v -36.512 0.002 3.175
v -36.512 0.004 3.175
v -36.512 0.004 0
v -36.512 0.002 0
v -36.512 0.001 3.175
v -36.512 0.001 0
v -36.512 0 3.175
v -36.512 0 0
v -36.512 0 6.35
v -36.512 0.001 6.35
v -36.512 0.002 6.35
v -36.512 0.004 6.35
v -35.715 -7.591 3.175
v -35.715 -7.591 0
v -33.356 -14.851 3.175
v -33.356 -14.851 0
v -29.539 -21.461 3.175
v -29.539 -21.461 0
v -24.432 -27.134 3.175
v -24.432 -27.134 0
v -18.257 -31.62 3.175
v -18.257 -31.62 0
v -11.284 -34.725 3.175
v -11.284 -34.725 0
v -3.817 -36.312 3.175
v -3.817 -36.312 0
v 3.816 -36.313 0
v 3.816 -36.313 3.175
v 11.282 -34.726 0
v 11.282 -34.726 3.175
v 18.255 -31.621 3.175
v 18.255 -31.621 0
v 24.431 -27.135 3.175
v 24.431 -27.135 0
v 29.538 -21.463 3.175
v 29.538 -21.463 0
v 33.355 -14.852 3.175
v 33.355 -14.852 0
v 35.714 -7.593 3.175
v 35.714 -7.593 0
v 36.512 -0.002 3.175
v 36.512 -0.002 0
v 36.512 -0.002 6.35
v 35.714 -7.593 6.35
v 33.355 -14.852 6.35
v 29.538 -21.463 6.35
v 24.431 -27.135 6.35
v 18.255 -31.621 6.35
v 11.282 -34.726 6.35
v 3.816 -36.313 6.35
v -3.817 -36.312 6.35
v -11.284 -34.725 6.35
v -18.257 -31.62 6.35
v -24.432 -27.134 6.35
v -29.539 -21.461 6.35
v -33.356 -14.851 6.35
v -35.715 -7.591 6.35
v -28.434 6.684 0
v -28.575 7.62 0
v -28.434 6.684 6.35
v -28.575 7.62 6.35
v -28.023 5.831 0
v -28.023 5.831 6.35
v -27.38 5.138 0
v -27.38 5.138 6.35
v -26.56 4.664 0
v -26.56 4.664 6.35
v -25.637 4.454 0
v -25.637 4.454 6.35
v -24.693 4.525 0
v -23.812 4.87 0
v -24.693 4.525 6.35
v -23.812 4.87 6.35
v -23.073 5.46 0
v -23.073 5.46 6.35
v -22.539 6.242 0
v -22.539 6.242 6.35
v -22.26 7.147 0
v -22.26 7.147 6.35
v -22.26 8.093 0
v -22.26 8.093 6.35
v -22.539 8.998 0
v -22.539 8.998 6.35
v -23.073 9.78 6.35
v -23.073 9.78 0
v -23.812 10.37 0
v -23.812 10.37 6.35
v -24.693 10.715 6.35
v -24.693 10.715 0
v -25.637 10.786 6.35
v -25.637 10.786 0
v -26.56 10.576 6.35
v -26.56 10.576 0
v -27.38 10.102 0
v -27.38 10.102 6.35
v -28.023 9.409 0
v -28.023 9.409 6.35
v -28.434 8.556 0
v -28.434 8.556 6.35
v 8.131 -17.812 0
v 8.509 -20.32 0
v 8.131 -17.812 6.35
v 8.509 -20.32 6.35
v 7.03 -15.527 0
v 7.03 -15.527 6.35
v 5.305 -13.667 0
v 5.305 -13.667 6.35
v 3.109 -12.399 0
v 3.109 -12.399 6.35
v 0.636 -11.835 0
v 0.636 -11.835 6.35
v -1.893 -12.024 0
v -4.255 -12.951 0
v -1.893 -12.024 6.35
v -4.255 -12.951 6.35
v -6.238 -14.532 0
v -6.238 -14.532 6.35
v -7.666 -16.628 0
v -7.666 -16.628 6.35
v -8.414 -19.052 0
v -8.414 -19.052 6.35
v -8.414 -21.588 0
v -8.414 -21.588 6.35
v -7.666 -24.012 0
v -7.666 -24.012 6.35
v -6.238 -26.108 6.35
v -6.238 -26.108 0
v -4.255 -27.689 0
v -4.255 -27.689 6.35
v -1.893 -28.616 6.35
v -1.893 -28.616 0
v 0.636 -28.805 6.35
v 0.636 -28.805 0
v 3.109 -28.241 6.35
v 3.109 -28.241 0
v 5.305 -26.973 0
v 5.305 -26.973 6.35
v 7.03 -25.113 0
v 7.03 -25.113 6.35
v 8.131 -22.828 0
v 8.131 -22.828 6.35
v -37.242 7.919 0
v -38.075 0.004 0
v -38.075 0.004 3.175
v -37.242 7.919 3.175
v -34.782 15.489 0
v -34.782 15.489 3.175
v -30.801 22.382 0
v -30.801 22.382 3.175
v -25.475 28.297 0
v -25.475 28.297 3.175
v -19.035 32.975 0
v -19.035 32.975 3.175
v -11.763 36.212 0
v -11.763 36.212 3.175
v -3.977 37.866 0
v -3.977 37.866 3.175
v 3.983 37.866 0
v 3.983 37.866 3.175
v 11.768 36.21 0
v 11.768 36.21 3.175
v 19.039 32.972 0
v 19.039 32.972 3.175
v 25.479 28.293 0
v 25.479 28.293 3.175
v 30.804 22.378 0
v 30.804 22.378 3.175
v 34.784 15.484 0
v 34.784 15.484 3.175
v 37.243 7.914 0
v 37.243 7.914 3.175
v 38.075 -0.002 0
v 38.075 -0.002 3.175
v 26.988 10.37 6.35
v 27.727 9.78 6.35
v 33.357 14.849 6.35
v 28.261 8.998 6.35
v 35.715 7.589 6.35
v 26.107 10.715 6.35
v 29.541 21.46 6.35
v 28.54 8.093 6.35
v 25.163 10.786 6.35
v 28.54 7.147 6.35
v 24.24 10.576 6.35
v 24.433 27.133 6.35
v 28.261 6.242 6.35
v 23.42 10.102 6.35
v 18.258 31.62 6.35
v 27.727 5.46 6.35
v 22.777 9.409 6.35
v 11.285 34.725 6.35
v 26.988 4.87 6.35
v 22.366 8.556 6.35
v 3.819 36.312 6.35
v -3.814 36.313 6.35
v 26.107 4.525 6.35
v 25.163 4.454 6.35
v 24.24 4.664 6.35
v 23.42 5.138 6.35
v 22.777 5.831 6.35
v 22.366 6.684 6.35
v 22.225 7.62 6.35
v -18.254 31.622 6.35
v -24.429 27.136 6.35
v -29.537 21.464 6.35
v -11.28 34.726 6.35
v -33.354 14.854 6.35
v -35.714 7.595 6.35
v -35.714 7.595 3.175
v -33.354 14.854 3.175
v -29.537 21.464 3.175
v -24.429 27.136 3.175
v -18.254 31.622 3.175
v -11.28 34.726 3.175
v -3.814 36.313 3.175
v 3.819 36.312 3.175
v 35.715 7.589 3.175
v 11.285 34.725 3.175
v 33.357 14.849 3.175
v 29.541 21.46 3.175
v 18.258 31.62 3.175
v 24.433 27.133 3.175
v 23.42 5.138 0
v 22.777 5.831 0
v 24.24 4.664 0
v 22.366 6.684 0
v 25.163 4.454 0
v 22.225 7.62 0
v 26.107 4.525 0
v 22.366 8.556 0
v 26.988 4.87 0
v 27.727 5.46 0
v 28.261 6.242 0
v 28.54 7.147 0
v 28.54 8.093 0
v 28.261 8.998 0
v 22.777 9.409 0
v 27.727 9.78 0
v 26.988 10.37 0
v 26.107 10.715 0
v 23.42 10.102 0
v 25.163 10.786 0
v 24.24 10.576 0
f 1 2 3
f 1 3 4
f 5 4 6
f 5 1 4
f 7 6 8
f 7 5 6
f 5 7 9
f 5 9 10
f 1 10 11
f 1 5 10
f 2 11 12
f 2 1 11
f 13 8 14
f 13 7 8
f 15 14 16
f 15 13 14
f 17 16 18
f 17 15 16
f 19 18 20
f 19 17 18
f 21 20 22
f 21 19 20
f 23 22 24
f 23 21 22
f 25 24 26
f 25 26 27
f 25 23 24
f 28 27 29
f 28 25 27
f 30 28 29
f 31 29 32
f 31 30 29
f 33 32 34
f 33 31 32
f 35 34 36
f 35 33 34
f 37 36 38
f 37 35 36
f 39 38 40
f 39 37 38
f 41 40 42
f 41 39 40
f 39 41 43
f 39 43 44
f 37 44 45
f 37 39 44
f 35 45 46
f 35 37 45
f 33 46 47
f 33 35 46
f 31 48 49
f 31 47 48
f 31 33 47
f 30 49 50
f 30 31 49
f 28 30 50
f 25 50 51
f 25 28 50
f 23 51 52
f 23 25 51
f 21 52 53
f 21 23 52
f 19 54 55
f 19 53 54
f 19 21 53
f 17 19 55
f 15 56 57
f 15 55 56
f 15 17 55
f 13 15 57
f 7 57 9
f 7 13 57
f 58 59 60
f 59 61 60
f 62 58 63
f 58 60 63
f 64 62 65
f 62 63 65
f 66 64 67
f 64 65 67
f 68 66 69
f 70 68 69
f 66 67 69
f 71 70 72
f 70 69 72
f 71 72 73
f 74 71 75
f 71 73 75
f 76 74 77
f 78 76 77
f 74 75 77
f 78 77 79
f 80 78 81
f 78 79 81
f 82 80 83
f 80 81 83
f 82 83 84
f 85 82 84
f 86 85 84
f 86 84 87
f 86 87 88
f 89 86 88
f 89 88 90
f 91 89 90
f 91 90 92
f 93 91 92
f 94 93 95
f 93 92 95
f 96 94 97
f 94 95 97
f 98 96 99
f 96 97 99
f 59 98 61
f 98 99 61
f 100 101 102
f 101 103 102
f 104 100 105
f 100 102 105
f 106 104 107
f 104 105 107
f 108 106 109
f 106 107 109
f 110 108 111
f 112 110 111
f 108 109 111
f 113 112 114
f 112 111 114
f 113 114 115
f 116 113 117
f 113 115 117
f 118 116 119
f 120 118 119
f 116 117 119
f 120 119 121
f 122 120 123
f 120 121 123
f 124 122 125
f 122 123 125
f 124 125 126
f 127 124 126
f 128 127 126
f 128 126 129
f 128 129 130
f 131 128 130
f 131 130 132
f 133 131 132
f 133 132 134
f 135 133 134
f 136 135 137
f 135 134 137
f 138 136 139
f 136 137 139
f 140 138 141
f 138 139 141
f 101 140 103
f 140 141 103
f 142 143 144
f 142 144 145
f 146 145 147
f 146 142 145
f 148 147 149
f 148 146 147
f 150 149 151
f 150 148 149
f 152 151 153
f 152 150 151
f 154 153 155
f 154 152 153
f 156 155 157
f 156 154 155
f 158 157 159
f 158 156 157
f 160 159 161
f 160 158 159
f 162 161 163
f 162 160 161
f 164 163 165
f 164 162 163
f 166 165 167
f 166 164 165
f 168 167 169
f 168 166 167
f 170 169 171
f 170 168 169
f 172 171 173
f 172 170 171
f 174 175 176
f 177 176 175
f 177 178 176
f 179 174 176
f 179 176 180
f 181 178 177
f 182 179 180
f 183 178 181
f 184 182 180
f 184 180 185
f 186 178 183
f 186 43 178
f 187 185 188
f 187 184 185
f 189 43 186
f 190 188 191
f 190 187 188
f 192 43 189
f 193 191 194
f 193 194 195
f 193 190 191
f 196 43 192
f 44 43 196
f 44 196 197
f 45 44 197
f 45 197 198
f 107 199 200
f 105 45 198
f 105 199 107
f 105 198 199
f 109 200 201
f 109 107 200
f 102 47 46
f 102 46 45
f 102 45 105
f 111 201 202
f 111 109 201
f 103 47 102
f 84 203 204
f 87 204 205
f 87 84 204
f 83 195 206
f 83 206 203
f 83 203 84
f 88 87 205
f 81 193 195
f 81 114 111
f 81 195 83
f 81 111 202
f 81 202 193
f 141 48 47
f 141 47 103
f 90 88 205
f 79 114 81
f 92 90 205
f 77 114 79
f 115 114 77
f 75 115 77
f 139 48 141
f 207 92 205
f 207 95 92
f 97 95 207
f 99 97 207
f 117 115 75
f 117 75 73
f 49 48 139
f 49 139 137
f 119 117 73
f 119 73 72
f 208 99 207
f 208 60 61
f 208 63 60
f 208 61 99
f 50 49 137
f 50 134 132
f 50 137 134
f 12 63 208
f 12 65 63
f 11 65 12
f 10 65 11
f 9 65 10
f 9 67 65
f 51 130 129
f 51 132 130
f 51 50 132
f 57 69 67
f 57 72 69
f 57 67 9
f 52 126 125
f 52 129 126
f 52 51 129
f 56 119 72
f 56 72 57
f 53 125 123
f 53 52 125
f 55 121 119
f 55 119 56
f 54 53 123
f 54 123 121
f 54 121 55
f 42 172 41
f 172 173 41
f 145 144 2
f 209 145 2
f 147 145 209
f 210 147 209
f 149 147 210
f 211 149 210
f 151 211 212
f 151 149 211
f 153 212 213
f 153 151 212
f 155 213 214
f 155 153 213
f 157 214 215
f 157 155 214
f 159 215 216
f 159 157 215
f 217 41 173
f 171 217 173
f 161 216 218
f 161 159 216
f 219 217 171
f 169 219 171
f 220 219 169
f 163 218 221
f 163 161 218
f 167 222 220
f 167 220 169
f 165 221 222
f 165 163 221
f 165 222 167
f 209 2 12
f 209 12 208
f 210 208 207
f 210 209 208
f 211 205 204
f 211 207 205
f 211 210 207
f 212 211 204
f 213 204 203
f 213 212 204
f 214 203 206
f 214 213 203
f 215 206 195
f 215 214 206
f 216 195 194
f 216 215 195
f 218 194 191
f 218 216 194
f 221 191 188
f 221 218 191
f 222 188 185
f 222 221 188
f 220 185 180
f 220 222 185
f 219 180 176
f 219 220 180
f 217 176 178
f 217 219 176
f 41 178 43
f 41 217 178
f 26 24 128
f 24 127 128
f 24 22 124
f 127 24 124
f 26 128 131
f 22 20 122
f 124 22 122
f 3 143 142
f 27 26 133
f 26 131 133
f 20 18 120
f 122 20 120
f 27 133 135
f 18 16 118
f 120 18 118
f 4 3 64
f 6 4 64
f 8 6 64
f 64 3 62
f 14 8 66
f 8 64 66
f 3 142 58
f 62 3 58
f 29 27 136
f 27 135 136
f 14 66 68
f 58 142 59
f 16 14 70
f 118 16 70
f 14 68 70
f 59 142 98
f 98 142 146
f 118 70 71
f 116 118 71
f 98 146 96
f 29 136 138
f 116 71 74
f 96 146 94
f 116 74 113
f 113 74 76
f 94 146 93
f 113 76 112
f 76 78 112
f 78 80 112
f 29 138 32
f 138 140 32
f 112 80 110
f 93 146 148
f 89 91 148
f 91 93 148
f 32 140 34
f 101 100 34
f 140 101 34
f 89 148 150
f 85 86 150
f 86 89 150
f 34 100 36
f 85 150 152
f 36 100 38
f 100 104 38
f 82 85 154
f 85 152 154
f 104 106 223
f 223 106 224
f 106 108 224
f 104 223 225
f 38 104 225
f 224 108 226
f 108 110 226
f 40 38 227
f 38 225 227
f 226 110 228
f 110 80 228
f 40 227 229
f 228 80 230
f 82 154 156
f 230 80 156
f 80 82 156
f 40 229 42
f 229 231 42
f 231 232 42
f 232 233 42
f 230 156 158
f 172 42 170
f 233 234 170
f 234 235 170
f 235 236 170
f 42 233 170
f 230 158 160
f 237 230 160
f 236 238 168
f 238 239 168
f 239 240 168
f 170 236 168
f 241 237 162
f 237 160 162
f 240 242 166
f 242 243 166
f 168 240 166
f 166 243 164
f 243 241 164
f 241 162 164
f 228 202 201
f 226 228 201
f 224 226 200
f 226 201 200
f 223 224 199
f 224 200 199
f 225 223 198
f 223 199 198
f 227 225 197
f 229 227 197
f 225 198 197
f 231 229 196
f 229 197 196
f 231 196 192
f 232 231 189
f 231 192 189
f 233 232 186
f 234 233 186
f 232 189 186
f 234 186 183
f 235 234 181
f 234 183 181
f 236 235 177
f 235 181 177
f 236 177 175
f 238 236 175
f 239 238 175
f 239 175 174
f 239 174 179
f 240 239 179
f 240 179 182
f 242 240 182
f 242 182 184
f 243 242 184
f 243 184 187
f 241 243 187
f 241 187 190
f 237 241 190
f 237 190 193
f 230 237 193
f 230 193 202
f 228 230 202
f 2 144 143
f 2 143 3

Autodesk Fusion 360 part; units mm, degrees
sketch "Sketch1" plane through (0, 0, 0) normal (0, 0, 1) x (1, 0, 0)
  circle A0 centre (0, 0) radius 38.0746
  dimension "d1" = 76.1492
extrude "Extrude1" add sketch "Sketch1" along normal blind 3.175
sketch "Sketch2" plane through (0, 0, 3.175) normal (0, 0, 1) x (-1, 0, 0)
  circle A0 centre (0, 0) radius 38.0746
  circle A1 centre (0, 0) radius 36.5125
  dimension "d4" = 73.025
extrude "Extrude2" add sketch "Sketch2" along normal blind 3.175 contours A1
sketch "Sketch3" plane through (0, 0, 6.35) normal (0, 0, 1) x (-1, 0, 0)
  circle A0 centre (0, 0) radius 36.5125
  circle A1 centre (25.4, -7.62) radius 3.175
  circle A2 centre (-25.4, -7.62) radius 3.175
  circle A3 centre (0, 20.6756) radius 5.08
  circle A4 centre (0, 0) radius 38.0746
  dimension "d7" = 50.8
  dimension "d8" = 25.4
  dimension "d9" = 7.62
  dimension "d10" = 6.35
  dimension "d11" = 6.35
  dimension "d12" = 10.16
  dimension "d13" = 20.6756
extrude "Extrude3" cut sketch "Sketch3" against normal blind 6.35 contours A1 | A2 | A3
sketch "Sketch4" plane through (0, 0, 6.35) normal (0, 0, 1) x (-1, 0, 0)
  circle A0 centre (-25.4, -7.62) radius 3.175
  circle A1 centre (0, 20.6756) radius 5.08
  circle A2 centre (25.4, -7.62) radius 3.175
  circle A3 centre (0, 0) radius 36.5125
  line L0 (38.0746, -0.0035) -> (36.5125, -0.0035)
  line L1 (-38.0746, 0.0019) -> (-36.5125, 0.0019)
  arc A4 (38.0746, -0.0035) -> (-38.0746, 0.0019) centre (0, 0) ccw
  arc A5 (36.5125, -0.0035) -> (-36.5125, 0.0019) centre (0, 0) ccw
  circle A6 centre (0, 20.6756) radius 8.509
  dimension "d16" = 76.1492
  dimension "d17" = 73.025
  dimension "d19" = 17.018
extrude "Extrude4" cut sketch "Sketch4" against normal through all contours A3 L0 L1 A4 A5
sketch "Sketch6" plane through (0, 0, 6.35) normal (0, 0, 1) x (1, 0, 0)
  circle A0 centre (0, -20.32) radius 8.509
  dimension "d20" = 17.018
extrude "Extrude5" cut sketch "Sketch6" against normal blind 27.94
equation "d2 = ( 0.25 / 2 ) * 1 in"
equation "d5 = ( 0.25 / 2 ) * 1 in"
